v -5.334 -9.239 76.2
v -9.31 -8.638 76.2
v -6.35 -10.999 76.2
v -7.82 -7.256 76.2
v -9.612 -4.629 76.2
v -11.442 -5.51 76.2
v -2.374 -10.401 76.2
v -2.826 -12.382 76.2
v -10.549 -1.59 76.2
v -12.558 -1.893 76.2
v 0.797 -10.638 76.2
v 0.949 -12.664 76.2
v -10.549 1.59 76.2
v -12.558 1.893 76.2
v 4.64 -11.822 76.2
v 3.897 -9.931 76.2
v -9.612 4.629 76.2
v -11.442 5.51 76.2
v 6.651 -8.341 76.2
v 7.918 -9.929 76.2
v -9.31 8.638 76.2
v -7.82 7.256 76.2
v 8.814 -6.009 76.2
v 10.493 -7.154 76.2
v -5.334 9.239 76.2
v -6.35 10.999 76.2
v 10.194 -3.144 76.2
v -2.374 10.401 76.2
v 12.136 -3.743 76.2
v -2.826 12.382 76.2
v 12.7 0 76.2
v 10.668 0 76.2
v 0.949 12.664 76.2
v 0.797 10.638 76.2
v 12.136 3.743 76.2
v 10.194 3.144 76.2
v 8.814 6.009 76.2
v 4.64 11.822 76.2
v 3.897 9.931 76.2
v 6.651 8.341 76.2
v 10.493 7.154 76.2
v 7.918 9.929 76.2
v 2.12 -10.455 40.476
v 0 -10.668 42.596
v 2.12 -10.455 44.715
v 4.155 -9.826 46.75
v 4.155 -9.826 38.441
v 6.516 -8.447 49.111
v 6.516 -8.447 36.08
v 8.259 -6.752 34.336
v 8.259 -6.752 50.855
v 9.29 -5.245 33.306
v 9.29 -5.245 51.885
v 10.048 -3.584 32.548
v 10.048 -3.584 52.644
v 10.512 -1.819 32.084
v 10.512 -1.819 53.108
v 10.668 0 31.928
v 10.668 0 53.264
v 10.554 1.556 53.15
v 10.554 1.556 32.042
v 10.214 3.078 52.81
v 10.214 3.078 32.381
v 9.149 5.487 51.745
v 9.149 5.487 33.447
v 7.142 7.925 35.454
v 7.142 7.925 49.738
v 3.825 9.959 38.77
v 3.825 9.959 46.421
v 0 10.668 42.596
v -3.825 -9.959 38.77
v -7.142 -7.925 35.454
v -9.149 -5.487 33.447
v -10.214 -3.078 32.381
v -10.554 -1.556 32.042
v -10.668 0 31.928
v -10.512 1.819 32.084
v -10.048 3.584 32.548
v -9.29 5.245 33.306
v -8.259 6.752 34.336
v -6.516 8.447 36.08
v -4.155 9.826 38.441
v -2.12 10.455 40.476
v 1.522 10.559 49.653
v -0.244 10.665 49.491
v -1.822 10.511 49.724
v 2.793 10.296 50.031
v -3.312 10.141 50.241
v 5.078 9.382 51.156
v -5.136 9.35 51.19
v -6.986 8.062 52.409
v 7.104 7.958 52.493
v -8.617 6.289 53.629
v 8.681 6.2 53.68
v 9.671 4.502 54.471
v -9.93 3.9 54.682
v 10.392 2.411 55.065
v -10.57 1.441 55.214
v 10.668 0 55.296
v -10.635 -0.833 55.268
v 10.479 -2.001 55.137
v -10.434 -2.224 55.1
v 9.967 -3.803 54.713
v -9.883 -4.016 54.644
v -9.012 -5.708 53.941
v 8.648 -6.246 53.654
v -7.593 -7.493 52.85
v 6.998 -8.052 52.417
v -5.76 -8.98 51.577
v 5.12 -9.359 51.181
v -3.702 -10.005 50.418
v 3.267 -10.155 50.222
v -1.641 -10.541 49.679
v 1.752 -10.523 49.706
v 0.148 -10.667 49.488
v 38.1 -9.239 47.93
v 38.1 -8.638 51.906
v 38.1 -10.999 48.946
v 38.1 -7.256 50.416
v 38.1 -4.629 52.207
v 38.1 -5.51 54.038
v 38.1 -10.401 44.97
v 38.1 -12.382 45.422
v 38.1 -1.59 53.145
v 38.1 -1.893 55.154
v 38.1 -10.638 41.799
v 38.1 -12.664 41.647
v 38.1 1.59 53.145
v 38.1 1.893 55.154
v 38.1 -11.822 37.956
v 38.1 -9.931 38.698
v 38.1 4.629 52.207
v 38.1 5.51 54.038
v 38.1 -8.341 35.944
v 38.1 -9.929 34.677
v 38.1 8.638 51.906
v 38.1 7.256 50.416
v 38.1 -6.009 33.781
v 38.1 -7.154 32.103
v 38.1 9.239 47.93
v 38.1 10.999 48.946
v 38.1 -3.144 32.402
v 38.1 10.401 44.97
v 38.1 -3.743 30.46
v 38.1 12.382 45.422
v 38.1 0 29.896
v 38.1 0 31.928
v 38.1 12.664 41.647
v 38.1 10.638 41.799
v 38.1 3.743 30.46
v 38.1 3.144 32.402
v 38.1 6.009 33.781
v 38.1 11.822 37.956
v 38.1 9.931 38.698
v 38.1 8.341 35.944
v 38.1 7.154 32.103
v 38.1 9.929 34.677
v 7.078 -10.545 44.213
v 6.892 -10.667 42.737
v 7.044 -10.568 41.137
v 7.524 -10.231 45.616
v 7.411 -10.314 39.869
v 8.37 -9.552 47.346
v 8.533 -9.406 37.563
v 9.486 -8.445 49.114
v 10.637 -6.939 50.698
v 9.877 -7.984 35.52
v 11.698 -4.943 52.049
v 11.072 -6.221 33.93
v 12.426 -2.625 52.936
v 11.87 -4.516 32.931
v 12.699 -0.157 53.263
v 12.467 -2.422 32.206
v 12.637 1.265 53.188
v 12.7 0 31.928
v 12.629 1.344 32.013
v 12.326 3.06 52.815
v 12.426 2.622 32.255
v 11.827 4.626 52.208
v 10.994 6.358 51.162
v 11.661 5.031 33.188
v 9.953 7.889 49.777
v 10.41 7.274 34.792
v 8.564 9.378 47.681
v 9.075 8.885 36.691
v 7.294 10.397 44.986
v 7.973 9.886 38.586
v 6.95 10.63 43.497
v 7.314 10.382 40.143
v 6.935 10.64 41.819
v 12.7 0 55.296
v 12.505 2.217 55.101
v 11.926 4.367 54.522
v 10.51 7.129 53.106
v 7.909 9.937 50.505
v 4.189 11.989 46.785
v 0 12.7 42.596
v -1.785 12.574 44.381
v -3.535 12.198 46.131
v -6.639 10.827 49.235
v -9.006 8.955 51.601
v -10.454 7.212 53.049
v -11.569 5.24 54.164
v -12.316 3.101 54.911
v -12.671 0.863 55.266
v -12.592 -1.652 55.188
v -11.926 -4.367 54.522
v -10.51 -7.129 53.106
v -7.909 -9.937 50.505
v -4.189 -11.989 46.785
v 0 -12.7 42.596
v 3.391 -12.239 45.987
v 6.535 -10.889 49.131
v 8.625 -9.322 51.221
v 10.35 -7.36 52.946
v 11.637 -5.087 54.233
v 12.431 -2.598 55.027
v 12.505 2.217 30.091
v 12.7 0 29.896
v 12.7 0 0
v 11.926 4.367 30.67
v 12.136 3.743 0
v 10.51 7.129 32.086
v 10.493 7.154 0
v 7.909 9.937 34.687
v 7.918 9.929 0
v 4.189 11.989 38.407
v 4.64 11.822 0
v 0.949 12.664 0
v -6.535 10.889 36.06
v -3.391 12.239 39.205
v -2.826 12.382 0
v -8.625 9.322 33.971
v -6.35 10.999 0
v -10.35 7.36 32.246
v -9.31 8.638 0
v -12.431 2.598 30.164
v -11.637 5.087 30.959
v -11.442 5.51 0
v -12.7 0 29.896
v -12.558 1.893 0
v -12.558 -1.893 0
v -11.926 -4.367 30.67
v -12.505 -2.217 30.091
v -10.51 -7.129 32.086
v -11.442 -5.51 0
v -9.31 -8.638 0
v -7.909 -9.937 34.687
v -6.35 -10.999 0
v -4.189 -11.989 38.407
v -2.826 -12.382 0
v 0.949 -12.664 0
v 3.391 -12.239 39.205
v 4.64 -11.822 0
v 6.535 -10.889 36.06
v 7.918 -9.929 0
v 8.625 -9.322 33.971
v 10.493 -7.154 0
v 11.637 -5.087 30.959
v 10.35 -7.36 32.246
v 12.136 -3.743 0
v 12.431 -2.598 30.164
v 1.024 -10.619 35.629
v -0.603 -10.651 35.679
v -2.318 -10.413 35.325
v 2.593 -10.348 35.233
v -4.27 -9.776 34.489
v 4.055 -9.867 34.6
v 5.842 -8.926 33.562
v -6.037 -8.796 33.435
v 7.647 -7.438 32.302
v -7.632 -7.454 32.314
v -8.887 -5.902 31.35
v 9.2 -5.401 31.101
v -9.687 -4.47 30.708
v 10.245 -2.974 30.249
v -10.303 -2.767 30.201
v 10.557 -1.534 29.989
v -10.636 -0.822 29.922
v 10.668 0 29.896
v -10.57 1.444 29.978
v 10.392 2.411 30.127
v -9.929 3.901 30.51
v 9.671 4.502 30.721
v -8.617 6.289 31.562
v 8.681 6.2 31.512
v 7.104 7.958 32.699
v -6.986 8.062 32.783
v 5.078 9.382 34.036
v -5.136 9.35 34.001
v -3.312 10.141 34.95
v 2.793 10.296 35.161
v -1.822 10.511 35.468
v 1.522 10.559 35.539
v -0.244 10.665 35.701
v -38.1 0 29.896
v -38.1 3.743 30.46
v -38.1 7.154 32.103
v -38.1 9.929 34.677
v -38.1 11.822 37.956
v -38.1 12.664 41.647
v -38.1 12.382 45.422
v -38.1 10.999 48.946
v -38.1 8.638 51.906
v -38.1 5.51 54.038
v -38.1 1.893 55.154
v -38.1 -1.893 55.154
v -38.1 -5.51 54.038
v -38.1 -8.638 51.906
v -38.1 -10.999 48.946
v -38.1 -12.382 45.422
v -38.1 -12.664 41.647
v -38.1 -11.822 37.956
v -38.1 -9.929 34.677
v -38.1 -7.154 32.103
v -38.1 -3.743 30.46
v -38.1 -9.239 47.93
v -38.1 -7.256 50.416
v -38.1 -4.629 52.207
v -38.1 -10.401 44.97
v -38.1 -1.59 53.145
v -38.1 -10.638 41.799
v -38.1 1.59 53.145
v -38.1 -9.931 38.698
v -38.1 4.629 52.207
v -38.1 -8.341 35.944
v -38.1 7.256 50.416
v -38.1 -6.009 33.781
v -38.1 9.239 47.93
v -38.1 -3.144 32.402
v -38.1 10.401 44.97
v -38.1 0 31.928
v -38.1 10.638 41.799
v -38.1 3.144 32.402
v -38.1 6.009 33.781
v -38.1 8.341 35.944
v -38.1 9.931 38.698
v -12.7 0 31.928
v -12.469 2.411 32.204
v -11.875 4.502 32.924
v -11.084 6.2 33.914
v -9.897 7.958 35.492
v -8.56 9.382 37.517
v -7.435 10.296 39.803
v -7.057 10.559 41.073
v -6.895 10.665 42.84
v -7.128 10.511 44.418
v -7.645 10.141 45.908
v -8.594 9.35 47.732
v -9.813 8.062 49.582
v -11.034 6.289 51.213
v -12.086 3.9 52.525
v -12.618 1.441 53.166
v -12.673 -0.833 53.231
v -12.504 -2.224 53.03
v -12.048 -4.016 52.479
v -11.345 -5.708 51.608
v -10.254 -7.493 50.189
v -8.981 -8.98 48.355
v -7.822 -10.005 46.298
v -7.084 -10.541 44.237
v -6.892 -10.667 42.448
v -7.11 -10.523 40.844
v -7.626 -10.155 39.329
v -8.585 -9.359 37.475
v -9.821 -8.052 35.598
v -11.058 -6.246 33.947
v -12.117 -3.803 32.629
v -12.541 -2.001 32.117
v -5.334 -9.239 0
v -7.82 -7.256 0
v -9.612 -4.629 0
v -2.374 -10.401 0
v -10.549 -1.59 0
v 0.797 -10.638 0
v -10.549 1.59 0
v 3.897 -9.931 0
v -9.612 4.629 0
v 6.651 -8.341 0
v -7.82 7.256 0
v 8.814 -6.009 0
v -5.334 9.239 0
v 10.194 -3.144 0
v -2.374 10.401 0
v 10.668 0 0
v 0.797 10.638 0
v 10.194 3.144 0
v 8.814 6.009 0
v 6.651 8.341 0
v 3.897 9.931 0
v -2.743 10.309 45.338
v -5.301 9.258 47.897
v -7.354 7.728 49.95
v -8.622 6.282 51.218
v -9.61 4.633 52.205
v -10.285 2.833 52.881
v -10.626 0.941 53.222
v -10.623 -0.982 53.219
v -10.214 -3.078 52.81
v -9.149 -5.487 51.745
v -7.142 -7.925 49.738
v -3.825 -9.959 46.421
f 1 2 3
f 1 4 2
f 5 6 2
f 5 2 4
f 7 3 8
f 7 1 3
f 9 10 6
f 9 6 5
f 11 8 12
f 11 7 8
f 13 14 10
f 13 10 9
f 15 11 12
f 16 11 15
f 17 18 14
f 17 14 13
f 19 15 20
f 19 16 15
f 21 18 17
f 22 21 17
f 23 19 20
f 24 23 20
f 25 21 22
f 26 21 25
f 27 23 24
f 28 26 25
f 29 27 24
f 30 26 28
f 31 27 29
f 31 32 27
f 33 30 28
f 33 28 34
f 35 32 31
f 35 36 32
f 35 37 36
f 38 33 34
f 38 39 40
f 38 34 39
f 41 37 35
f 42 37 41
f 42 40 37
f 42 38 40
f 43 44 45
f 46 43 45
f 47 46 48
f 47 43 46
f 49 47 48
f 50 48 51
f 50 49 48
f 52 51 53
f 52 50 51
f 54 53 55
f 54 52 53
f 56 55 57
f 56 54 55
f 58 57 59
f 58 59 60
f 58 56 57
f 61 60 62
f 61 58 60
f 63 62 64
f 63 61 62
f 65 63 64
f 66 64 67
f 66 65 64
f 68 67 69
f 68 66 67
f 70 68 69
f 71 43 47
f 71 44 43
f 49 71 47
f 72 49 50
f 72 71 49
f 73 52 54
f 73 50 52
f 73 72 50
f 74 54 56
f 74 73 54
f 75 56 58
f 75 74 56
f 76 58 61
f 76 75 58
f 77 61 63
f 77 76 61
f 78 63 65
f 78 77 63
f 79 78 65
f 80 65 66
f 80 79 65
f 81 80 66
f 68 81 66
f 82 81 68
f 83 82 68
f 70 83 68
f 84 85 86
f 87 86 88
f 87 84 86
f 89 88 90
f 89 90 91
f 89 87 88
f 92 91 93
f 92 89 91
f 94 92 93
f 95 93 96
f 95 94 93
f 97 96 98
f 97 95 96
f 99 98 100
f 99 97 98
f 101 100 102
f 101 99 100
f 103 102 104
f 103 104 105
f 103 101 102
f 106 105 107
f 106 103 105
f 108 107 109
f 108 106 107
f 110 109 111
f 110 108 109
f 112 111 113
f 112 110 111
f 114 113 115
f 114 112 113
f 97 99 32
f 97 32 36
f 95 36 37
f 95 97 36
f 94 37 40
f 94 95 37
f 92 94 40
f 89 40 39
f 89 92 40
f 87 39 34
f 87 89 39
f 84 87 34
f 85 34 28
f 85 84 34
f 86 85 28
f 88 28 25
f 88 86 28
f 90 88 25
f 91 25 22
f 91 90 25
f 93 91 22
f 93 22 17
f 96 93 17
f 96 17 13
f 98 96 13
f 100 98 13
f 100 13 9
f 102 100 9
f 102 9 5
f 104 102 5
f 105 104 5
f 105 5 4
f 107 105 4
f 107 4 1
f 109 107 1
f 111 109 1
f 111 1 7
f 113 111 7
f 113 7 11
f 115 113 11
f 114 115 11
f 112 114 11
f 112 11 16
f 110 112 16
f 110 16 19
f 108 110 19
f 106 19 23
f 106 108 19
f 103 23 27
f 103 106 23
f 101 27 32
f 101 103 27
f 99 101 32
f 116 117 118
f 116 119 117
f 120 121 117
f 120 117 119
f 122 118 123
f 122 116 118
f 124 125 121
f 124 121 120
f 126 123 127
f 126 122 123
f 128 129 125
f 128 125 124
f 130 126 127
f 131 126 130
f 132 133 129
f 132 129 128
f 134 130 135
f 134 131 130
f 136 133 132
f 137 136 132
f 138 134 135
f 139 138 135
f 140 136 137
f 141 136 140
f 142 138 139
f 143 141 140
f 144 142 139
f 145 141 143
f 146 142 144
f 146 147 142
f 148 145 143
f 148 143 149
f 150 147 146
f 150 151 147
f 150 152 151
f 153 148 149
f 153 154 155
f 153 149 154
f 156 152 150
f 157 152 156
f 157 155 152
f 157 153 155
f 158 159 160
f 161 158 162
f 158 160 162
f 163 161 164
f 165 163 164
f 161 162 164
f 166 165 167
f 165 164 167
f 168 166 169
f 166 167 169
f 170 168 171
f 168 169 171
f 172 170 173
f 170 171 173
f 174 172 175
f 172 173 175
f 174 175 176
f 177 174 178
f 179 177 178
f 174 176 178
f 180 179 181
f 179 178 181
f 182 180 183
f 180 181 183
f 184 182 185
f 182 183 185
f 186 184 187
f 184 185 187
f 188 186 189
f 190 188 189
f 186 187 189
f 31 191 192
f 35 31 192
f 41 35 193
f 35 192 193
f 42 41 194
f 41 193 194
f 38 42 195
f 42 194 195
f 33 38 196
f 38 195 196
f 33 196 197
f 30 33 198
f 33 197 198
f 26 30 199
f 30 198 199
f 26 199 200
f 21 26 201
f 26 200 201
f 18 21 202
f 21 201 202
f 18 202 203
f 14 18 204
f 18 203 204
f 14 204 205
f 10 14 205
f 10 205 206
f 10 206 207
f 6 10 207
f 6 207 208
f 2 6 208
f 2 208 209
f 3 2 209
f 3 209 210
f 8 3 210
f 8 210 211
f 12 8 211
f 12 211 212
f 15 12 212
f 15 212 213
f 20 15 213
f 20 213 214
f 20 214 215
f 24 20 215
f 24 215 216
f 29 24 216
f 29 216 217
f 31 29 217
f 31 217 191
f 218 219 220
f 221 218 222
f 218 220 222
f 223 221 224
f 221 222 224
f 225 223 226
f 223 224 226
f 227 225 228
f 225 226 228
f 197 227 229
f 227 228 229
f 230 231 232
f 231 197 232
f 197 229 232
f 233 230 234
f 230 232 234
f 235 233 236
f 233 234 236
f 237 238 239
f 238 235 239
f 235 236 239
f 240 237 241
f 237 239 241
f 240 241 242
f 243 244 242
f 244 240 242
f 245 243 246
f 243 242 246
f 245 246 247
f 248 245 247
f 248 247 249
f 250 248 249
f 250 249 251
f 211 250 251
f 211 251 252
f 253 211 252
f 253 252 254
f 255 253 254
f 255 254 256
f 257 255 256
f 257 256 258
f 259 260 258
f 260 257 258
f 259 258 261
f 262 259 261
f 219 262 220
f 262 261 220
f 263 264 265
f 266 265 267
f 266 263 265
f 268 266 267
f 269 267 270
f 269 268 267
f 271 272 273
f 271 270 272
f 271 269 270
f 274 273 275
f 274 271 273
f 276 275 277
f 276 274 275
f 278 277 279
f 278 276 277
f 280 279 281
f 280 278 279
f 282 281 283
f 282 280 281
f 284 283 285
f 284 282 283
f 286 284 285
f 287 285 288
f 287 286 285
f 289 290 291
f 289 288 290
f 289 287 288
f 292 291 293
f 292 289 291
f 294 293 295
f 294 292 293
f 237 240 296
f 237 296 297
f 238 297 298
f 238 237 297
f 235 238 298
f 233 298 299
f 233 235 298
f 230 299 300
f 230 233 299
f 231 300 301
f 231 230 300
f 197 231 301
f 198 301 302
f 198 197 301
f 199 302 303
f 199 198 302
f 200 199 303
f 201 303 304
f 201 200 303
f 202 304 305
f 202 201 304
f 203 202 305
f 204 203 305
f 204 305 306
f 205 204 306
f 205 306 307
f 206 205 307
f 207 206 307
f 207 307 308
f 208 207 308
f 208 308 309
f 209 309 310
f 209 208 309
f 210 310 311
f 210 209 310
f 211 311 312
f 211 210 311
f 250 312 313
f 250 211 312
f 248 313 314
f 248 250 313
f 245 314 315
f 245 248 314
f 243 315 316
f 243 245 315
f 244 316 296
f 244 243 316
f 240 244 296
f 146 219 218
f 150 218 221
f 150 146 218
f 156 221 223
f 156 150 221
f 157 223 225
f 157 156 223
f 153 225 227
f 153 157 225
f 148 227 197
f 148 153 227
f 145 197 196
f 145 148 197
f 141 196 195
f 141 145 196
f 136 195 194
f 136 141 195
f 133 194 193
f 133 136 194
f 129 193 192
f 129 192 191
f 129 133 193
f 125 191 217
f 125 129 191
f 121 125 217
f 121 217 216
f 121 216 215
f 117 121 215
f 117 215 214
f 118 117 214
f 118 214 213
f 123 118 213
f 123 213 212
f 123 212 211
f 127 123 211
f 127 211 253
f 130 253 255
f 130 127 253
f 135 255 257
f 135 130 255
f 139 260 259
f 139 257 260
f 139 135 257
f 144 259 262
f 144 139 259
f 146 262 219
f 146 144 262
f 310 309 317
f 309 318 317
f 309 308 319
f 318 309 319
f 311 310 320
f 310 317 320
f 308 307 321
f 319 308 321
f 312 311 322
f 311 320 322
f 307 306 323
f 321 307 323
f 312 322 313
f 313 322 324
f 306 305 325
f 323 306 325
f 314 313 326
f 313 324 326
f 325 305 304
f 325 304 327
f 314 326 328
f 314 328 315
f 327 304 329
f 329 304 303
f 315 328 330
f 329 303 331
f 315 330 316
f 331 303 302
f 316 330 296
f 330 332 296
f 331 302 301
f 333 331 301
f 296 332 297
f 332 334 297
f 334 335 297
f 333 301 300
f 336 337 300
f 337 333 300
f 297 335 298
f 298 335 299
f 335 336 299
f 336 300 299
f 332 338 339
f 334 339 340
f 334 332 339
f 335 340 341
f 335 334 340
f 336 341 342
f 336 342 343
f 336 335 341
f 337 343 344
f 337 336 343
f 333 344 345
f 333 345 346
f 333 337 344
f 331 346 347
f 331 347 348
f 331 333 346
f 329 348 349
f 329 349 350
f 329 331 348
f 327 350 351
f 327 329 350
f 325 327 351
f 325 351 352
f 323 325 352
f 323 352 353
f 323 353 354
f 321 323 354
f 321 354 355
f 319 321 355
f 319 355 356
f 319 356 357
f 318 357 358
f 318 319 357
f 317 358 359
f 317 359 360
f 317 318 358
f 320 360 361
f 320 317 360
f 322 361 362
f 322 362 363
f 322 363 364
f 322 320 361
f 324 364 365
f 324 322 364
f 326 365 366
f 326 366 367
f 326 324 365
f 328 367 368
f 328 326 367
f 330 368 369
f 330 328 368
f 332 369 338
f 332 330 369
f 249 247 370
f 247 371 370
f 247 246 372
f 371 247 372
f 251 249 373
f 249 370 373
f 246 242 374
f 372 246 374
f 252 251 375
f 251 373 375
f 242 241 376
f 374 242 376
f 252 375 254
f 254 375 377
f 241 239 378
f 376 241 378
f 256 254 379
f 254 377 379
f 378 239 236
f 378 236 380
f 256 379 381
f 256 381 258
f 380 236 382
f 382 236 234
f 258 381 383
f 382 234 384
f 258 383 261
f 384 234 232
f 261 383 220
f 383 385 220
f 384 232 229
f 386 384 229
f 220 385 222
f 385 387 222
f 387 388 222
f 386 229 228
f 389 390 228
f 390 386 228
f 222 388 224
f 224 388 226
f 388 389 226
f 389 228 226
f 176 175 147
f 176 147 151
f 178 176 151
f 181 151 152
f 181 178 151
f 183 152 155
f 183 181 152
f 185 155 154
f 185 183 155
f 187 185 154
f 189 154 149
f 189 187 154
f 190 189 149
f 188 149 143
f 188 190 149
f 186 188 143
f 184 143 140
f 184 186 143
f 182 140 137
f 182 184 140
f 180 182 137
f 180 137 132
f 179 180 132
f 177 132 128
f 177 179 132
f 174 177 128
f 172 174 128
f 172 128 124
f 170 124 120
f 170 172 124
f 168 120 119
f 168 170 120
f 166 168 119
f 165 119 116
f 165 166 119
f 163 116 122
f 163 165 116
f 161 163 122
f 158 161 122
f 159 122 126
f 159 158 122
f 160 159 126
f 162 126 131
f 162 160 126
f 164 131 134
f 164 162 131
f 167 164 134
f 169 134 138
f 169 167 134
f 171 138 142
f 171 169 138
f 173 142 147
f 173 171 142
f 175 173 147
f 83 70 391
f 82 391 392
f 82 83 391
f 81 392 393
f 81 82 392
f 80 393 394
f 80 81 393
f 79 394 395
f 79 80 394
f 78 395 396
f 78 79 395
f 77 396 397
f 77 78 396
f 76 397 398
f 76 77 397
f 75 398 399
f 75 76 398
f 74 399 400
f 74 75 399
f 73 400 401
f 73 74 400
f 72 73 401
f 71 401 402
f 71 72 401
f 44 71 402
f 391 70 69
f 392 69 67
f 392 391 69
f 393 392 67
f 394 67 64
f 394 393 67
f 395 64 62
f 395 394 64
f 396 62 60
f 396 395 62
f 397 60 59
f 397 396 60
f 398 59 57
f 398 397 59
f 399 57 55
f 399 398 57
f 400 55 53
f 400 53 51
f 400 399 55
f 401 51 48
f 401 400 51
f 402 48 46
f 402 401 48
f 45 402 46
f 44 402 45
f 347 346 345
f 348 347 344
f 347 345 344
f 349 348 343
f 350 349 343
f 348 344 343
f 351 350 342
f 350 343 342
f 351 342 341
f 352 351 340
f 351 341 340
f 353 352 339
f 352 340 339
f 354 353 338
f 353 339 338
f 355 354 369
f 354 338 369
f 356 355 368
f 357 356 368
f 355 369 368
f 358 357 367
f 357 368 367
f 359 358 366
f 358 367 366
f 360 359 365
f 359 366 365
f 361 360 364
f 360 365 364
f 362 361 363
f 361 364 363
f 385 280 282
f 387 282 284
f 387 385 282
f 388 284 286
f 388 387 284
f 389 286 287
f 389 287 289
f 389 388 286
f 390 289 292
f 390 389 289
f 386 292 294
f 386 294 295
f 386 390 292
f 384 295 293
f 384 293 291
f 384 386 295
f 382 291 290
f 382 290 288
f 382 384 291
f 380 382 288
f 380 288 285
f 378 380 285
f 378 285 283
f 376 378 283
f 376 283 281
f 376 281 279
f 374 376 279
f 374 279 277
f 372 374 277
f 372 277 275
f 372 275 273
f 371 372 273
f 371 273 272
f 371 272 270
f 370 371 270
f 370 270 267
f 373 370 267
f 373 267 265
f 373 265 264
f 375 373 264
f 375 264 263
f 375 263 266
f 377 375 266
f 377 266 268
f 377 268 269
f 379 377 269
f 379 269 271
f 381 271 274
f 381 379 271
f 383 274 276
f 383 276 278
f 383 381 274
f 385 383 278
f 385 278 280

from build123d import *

# Parameters (mm, degrees)
SKETCH1_R           = 12.7
SKETCH1_R_2         = 10.668
BOSS_EXTRUDE1_DEPTH = 76.2
SKETCH2_R           = 12.7
SKETCH2_R_2         = 10.668
BOSS_EXTRUDE2_DEPTH = 38.1


with BuildPart() as part:
    # Sketch1 → Boss-Extrude1 (new body)
    with BuildSketch(Plane.XY):
        Circle(SKETCH1_R)
        Circle(SKETCH1_R_2, mode=Mode.SUBTRACT)
    extrude(amount=BOSS_EXTRUDE1_DEPTH)

    # Sketch2 → Boss-Extrude2 (add, symmetric)
    with BuildSketch(Plane(origin=(0, 0, 0), x_dir=(0, 0, -1), z_dir=(1, 0, 0))):
        with Locations((-42.5958, 0)):
            Circle(SKETCH2_R)
        with Locations((-42.5958, 0)):
            Circle(SKETCH2_R_2, mode=Mode.SUBTRACT)
    extrude(amount=BOSS_EXTRUDE2_DEPTH, both=True)


solid = part.part
